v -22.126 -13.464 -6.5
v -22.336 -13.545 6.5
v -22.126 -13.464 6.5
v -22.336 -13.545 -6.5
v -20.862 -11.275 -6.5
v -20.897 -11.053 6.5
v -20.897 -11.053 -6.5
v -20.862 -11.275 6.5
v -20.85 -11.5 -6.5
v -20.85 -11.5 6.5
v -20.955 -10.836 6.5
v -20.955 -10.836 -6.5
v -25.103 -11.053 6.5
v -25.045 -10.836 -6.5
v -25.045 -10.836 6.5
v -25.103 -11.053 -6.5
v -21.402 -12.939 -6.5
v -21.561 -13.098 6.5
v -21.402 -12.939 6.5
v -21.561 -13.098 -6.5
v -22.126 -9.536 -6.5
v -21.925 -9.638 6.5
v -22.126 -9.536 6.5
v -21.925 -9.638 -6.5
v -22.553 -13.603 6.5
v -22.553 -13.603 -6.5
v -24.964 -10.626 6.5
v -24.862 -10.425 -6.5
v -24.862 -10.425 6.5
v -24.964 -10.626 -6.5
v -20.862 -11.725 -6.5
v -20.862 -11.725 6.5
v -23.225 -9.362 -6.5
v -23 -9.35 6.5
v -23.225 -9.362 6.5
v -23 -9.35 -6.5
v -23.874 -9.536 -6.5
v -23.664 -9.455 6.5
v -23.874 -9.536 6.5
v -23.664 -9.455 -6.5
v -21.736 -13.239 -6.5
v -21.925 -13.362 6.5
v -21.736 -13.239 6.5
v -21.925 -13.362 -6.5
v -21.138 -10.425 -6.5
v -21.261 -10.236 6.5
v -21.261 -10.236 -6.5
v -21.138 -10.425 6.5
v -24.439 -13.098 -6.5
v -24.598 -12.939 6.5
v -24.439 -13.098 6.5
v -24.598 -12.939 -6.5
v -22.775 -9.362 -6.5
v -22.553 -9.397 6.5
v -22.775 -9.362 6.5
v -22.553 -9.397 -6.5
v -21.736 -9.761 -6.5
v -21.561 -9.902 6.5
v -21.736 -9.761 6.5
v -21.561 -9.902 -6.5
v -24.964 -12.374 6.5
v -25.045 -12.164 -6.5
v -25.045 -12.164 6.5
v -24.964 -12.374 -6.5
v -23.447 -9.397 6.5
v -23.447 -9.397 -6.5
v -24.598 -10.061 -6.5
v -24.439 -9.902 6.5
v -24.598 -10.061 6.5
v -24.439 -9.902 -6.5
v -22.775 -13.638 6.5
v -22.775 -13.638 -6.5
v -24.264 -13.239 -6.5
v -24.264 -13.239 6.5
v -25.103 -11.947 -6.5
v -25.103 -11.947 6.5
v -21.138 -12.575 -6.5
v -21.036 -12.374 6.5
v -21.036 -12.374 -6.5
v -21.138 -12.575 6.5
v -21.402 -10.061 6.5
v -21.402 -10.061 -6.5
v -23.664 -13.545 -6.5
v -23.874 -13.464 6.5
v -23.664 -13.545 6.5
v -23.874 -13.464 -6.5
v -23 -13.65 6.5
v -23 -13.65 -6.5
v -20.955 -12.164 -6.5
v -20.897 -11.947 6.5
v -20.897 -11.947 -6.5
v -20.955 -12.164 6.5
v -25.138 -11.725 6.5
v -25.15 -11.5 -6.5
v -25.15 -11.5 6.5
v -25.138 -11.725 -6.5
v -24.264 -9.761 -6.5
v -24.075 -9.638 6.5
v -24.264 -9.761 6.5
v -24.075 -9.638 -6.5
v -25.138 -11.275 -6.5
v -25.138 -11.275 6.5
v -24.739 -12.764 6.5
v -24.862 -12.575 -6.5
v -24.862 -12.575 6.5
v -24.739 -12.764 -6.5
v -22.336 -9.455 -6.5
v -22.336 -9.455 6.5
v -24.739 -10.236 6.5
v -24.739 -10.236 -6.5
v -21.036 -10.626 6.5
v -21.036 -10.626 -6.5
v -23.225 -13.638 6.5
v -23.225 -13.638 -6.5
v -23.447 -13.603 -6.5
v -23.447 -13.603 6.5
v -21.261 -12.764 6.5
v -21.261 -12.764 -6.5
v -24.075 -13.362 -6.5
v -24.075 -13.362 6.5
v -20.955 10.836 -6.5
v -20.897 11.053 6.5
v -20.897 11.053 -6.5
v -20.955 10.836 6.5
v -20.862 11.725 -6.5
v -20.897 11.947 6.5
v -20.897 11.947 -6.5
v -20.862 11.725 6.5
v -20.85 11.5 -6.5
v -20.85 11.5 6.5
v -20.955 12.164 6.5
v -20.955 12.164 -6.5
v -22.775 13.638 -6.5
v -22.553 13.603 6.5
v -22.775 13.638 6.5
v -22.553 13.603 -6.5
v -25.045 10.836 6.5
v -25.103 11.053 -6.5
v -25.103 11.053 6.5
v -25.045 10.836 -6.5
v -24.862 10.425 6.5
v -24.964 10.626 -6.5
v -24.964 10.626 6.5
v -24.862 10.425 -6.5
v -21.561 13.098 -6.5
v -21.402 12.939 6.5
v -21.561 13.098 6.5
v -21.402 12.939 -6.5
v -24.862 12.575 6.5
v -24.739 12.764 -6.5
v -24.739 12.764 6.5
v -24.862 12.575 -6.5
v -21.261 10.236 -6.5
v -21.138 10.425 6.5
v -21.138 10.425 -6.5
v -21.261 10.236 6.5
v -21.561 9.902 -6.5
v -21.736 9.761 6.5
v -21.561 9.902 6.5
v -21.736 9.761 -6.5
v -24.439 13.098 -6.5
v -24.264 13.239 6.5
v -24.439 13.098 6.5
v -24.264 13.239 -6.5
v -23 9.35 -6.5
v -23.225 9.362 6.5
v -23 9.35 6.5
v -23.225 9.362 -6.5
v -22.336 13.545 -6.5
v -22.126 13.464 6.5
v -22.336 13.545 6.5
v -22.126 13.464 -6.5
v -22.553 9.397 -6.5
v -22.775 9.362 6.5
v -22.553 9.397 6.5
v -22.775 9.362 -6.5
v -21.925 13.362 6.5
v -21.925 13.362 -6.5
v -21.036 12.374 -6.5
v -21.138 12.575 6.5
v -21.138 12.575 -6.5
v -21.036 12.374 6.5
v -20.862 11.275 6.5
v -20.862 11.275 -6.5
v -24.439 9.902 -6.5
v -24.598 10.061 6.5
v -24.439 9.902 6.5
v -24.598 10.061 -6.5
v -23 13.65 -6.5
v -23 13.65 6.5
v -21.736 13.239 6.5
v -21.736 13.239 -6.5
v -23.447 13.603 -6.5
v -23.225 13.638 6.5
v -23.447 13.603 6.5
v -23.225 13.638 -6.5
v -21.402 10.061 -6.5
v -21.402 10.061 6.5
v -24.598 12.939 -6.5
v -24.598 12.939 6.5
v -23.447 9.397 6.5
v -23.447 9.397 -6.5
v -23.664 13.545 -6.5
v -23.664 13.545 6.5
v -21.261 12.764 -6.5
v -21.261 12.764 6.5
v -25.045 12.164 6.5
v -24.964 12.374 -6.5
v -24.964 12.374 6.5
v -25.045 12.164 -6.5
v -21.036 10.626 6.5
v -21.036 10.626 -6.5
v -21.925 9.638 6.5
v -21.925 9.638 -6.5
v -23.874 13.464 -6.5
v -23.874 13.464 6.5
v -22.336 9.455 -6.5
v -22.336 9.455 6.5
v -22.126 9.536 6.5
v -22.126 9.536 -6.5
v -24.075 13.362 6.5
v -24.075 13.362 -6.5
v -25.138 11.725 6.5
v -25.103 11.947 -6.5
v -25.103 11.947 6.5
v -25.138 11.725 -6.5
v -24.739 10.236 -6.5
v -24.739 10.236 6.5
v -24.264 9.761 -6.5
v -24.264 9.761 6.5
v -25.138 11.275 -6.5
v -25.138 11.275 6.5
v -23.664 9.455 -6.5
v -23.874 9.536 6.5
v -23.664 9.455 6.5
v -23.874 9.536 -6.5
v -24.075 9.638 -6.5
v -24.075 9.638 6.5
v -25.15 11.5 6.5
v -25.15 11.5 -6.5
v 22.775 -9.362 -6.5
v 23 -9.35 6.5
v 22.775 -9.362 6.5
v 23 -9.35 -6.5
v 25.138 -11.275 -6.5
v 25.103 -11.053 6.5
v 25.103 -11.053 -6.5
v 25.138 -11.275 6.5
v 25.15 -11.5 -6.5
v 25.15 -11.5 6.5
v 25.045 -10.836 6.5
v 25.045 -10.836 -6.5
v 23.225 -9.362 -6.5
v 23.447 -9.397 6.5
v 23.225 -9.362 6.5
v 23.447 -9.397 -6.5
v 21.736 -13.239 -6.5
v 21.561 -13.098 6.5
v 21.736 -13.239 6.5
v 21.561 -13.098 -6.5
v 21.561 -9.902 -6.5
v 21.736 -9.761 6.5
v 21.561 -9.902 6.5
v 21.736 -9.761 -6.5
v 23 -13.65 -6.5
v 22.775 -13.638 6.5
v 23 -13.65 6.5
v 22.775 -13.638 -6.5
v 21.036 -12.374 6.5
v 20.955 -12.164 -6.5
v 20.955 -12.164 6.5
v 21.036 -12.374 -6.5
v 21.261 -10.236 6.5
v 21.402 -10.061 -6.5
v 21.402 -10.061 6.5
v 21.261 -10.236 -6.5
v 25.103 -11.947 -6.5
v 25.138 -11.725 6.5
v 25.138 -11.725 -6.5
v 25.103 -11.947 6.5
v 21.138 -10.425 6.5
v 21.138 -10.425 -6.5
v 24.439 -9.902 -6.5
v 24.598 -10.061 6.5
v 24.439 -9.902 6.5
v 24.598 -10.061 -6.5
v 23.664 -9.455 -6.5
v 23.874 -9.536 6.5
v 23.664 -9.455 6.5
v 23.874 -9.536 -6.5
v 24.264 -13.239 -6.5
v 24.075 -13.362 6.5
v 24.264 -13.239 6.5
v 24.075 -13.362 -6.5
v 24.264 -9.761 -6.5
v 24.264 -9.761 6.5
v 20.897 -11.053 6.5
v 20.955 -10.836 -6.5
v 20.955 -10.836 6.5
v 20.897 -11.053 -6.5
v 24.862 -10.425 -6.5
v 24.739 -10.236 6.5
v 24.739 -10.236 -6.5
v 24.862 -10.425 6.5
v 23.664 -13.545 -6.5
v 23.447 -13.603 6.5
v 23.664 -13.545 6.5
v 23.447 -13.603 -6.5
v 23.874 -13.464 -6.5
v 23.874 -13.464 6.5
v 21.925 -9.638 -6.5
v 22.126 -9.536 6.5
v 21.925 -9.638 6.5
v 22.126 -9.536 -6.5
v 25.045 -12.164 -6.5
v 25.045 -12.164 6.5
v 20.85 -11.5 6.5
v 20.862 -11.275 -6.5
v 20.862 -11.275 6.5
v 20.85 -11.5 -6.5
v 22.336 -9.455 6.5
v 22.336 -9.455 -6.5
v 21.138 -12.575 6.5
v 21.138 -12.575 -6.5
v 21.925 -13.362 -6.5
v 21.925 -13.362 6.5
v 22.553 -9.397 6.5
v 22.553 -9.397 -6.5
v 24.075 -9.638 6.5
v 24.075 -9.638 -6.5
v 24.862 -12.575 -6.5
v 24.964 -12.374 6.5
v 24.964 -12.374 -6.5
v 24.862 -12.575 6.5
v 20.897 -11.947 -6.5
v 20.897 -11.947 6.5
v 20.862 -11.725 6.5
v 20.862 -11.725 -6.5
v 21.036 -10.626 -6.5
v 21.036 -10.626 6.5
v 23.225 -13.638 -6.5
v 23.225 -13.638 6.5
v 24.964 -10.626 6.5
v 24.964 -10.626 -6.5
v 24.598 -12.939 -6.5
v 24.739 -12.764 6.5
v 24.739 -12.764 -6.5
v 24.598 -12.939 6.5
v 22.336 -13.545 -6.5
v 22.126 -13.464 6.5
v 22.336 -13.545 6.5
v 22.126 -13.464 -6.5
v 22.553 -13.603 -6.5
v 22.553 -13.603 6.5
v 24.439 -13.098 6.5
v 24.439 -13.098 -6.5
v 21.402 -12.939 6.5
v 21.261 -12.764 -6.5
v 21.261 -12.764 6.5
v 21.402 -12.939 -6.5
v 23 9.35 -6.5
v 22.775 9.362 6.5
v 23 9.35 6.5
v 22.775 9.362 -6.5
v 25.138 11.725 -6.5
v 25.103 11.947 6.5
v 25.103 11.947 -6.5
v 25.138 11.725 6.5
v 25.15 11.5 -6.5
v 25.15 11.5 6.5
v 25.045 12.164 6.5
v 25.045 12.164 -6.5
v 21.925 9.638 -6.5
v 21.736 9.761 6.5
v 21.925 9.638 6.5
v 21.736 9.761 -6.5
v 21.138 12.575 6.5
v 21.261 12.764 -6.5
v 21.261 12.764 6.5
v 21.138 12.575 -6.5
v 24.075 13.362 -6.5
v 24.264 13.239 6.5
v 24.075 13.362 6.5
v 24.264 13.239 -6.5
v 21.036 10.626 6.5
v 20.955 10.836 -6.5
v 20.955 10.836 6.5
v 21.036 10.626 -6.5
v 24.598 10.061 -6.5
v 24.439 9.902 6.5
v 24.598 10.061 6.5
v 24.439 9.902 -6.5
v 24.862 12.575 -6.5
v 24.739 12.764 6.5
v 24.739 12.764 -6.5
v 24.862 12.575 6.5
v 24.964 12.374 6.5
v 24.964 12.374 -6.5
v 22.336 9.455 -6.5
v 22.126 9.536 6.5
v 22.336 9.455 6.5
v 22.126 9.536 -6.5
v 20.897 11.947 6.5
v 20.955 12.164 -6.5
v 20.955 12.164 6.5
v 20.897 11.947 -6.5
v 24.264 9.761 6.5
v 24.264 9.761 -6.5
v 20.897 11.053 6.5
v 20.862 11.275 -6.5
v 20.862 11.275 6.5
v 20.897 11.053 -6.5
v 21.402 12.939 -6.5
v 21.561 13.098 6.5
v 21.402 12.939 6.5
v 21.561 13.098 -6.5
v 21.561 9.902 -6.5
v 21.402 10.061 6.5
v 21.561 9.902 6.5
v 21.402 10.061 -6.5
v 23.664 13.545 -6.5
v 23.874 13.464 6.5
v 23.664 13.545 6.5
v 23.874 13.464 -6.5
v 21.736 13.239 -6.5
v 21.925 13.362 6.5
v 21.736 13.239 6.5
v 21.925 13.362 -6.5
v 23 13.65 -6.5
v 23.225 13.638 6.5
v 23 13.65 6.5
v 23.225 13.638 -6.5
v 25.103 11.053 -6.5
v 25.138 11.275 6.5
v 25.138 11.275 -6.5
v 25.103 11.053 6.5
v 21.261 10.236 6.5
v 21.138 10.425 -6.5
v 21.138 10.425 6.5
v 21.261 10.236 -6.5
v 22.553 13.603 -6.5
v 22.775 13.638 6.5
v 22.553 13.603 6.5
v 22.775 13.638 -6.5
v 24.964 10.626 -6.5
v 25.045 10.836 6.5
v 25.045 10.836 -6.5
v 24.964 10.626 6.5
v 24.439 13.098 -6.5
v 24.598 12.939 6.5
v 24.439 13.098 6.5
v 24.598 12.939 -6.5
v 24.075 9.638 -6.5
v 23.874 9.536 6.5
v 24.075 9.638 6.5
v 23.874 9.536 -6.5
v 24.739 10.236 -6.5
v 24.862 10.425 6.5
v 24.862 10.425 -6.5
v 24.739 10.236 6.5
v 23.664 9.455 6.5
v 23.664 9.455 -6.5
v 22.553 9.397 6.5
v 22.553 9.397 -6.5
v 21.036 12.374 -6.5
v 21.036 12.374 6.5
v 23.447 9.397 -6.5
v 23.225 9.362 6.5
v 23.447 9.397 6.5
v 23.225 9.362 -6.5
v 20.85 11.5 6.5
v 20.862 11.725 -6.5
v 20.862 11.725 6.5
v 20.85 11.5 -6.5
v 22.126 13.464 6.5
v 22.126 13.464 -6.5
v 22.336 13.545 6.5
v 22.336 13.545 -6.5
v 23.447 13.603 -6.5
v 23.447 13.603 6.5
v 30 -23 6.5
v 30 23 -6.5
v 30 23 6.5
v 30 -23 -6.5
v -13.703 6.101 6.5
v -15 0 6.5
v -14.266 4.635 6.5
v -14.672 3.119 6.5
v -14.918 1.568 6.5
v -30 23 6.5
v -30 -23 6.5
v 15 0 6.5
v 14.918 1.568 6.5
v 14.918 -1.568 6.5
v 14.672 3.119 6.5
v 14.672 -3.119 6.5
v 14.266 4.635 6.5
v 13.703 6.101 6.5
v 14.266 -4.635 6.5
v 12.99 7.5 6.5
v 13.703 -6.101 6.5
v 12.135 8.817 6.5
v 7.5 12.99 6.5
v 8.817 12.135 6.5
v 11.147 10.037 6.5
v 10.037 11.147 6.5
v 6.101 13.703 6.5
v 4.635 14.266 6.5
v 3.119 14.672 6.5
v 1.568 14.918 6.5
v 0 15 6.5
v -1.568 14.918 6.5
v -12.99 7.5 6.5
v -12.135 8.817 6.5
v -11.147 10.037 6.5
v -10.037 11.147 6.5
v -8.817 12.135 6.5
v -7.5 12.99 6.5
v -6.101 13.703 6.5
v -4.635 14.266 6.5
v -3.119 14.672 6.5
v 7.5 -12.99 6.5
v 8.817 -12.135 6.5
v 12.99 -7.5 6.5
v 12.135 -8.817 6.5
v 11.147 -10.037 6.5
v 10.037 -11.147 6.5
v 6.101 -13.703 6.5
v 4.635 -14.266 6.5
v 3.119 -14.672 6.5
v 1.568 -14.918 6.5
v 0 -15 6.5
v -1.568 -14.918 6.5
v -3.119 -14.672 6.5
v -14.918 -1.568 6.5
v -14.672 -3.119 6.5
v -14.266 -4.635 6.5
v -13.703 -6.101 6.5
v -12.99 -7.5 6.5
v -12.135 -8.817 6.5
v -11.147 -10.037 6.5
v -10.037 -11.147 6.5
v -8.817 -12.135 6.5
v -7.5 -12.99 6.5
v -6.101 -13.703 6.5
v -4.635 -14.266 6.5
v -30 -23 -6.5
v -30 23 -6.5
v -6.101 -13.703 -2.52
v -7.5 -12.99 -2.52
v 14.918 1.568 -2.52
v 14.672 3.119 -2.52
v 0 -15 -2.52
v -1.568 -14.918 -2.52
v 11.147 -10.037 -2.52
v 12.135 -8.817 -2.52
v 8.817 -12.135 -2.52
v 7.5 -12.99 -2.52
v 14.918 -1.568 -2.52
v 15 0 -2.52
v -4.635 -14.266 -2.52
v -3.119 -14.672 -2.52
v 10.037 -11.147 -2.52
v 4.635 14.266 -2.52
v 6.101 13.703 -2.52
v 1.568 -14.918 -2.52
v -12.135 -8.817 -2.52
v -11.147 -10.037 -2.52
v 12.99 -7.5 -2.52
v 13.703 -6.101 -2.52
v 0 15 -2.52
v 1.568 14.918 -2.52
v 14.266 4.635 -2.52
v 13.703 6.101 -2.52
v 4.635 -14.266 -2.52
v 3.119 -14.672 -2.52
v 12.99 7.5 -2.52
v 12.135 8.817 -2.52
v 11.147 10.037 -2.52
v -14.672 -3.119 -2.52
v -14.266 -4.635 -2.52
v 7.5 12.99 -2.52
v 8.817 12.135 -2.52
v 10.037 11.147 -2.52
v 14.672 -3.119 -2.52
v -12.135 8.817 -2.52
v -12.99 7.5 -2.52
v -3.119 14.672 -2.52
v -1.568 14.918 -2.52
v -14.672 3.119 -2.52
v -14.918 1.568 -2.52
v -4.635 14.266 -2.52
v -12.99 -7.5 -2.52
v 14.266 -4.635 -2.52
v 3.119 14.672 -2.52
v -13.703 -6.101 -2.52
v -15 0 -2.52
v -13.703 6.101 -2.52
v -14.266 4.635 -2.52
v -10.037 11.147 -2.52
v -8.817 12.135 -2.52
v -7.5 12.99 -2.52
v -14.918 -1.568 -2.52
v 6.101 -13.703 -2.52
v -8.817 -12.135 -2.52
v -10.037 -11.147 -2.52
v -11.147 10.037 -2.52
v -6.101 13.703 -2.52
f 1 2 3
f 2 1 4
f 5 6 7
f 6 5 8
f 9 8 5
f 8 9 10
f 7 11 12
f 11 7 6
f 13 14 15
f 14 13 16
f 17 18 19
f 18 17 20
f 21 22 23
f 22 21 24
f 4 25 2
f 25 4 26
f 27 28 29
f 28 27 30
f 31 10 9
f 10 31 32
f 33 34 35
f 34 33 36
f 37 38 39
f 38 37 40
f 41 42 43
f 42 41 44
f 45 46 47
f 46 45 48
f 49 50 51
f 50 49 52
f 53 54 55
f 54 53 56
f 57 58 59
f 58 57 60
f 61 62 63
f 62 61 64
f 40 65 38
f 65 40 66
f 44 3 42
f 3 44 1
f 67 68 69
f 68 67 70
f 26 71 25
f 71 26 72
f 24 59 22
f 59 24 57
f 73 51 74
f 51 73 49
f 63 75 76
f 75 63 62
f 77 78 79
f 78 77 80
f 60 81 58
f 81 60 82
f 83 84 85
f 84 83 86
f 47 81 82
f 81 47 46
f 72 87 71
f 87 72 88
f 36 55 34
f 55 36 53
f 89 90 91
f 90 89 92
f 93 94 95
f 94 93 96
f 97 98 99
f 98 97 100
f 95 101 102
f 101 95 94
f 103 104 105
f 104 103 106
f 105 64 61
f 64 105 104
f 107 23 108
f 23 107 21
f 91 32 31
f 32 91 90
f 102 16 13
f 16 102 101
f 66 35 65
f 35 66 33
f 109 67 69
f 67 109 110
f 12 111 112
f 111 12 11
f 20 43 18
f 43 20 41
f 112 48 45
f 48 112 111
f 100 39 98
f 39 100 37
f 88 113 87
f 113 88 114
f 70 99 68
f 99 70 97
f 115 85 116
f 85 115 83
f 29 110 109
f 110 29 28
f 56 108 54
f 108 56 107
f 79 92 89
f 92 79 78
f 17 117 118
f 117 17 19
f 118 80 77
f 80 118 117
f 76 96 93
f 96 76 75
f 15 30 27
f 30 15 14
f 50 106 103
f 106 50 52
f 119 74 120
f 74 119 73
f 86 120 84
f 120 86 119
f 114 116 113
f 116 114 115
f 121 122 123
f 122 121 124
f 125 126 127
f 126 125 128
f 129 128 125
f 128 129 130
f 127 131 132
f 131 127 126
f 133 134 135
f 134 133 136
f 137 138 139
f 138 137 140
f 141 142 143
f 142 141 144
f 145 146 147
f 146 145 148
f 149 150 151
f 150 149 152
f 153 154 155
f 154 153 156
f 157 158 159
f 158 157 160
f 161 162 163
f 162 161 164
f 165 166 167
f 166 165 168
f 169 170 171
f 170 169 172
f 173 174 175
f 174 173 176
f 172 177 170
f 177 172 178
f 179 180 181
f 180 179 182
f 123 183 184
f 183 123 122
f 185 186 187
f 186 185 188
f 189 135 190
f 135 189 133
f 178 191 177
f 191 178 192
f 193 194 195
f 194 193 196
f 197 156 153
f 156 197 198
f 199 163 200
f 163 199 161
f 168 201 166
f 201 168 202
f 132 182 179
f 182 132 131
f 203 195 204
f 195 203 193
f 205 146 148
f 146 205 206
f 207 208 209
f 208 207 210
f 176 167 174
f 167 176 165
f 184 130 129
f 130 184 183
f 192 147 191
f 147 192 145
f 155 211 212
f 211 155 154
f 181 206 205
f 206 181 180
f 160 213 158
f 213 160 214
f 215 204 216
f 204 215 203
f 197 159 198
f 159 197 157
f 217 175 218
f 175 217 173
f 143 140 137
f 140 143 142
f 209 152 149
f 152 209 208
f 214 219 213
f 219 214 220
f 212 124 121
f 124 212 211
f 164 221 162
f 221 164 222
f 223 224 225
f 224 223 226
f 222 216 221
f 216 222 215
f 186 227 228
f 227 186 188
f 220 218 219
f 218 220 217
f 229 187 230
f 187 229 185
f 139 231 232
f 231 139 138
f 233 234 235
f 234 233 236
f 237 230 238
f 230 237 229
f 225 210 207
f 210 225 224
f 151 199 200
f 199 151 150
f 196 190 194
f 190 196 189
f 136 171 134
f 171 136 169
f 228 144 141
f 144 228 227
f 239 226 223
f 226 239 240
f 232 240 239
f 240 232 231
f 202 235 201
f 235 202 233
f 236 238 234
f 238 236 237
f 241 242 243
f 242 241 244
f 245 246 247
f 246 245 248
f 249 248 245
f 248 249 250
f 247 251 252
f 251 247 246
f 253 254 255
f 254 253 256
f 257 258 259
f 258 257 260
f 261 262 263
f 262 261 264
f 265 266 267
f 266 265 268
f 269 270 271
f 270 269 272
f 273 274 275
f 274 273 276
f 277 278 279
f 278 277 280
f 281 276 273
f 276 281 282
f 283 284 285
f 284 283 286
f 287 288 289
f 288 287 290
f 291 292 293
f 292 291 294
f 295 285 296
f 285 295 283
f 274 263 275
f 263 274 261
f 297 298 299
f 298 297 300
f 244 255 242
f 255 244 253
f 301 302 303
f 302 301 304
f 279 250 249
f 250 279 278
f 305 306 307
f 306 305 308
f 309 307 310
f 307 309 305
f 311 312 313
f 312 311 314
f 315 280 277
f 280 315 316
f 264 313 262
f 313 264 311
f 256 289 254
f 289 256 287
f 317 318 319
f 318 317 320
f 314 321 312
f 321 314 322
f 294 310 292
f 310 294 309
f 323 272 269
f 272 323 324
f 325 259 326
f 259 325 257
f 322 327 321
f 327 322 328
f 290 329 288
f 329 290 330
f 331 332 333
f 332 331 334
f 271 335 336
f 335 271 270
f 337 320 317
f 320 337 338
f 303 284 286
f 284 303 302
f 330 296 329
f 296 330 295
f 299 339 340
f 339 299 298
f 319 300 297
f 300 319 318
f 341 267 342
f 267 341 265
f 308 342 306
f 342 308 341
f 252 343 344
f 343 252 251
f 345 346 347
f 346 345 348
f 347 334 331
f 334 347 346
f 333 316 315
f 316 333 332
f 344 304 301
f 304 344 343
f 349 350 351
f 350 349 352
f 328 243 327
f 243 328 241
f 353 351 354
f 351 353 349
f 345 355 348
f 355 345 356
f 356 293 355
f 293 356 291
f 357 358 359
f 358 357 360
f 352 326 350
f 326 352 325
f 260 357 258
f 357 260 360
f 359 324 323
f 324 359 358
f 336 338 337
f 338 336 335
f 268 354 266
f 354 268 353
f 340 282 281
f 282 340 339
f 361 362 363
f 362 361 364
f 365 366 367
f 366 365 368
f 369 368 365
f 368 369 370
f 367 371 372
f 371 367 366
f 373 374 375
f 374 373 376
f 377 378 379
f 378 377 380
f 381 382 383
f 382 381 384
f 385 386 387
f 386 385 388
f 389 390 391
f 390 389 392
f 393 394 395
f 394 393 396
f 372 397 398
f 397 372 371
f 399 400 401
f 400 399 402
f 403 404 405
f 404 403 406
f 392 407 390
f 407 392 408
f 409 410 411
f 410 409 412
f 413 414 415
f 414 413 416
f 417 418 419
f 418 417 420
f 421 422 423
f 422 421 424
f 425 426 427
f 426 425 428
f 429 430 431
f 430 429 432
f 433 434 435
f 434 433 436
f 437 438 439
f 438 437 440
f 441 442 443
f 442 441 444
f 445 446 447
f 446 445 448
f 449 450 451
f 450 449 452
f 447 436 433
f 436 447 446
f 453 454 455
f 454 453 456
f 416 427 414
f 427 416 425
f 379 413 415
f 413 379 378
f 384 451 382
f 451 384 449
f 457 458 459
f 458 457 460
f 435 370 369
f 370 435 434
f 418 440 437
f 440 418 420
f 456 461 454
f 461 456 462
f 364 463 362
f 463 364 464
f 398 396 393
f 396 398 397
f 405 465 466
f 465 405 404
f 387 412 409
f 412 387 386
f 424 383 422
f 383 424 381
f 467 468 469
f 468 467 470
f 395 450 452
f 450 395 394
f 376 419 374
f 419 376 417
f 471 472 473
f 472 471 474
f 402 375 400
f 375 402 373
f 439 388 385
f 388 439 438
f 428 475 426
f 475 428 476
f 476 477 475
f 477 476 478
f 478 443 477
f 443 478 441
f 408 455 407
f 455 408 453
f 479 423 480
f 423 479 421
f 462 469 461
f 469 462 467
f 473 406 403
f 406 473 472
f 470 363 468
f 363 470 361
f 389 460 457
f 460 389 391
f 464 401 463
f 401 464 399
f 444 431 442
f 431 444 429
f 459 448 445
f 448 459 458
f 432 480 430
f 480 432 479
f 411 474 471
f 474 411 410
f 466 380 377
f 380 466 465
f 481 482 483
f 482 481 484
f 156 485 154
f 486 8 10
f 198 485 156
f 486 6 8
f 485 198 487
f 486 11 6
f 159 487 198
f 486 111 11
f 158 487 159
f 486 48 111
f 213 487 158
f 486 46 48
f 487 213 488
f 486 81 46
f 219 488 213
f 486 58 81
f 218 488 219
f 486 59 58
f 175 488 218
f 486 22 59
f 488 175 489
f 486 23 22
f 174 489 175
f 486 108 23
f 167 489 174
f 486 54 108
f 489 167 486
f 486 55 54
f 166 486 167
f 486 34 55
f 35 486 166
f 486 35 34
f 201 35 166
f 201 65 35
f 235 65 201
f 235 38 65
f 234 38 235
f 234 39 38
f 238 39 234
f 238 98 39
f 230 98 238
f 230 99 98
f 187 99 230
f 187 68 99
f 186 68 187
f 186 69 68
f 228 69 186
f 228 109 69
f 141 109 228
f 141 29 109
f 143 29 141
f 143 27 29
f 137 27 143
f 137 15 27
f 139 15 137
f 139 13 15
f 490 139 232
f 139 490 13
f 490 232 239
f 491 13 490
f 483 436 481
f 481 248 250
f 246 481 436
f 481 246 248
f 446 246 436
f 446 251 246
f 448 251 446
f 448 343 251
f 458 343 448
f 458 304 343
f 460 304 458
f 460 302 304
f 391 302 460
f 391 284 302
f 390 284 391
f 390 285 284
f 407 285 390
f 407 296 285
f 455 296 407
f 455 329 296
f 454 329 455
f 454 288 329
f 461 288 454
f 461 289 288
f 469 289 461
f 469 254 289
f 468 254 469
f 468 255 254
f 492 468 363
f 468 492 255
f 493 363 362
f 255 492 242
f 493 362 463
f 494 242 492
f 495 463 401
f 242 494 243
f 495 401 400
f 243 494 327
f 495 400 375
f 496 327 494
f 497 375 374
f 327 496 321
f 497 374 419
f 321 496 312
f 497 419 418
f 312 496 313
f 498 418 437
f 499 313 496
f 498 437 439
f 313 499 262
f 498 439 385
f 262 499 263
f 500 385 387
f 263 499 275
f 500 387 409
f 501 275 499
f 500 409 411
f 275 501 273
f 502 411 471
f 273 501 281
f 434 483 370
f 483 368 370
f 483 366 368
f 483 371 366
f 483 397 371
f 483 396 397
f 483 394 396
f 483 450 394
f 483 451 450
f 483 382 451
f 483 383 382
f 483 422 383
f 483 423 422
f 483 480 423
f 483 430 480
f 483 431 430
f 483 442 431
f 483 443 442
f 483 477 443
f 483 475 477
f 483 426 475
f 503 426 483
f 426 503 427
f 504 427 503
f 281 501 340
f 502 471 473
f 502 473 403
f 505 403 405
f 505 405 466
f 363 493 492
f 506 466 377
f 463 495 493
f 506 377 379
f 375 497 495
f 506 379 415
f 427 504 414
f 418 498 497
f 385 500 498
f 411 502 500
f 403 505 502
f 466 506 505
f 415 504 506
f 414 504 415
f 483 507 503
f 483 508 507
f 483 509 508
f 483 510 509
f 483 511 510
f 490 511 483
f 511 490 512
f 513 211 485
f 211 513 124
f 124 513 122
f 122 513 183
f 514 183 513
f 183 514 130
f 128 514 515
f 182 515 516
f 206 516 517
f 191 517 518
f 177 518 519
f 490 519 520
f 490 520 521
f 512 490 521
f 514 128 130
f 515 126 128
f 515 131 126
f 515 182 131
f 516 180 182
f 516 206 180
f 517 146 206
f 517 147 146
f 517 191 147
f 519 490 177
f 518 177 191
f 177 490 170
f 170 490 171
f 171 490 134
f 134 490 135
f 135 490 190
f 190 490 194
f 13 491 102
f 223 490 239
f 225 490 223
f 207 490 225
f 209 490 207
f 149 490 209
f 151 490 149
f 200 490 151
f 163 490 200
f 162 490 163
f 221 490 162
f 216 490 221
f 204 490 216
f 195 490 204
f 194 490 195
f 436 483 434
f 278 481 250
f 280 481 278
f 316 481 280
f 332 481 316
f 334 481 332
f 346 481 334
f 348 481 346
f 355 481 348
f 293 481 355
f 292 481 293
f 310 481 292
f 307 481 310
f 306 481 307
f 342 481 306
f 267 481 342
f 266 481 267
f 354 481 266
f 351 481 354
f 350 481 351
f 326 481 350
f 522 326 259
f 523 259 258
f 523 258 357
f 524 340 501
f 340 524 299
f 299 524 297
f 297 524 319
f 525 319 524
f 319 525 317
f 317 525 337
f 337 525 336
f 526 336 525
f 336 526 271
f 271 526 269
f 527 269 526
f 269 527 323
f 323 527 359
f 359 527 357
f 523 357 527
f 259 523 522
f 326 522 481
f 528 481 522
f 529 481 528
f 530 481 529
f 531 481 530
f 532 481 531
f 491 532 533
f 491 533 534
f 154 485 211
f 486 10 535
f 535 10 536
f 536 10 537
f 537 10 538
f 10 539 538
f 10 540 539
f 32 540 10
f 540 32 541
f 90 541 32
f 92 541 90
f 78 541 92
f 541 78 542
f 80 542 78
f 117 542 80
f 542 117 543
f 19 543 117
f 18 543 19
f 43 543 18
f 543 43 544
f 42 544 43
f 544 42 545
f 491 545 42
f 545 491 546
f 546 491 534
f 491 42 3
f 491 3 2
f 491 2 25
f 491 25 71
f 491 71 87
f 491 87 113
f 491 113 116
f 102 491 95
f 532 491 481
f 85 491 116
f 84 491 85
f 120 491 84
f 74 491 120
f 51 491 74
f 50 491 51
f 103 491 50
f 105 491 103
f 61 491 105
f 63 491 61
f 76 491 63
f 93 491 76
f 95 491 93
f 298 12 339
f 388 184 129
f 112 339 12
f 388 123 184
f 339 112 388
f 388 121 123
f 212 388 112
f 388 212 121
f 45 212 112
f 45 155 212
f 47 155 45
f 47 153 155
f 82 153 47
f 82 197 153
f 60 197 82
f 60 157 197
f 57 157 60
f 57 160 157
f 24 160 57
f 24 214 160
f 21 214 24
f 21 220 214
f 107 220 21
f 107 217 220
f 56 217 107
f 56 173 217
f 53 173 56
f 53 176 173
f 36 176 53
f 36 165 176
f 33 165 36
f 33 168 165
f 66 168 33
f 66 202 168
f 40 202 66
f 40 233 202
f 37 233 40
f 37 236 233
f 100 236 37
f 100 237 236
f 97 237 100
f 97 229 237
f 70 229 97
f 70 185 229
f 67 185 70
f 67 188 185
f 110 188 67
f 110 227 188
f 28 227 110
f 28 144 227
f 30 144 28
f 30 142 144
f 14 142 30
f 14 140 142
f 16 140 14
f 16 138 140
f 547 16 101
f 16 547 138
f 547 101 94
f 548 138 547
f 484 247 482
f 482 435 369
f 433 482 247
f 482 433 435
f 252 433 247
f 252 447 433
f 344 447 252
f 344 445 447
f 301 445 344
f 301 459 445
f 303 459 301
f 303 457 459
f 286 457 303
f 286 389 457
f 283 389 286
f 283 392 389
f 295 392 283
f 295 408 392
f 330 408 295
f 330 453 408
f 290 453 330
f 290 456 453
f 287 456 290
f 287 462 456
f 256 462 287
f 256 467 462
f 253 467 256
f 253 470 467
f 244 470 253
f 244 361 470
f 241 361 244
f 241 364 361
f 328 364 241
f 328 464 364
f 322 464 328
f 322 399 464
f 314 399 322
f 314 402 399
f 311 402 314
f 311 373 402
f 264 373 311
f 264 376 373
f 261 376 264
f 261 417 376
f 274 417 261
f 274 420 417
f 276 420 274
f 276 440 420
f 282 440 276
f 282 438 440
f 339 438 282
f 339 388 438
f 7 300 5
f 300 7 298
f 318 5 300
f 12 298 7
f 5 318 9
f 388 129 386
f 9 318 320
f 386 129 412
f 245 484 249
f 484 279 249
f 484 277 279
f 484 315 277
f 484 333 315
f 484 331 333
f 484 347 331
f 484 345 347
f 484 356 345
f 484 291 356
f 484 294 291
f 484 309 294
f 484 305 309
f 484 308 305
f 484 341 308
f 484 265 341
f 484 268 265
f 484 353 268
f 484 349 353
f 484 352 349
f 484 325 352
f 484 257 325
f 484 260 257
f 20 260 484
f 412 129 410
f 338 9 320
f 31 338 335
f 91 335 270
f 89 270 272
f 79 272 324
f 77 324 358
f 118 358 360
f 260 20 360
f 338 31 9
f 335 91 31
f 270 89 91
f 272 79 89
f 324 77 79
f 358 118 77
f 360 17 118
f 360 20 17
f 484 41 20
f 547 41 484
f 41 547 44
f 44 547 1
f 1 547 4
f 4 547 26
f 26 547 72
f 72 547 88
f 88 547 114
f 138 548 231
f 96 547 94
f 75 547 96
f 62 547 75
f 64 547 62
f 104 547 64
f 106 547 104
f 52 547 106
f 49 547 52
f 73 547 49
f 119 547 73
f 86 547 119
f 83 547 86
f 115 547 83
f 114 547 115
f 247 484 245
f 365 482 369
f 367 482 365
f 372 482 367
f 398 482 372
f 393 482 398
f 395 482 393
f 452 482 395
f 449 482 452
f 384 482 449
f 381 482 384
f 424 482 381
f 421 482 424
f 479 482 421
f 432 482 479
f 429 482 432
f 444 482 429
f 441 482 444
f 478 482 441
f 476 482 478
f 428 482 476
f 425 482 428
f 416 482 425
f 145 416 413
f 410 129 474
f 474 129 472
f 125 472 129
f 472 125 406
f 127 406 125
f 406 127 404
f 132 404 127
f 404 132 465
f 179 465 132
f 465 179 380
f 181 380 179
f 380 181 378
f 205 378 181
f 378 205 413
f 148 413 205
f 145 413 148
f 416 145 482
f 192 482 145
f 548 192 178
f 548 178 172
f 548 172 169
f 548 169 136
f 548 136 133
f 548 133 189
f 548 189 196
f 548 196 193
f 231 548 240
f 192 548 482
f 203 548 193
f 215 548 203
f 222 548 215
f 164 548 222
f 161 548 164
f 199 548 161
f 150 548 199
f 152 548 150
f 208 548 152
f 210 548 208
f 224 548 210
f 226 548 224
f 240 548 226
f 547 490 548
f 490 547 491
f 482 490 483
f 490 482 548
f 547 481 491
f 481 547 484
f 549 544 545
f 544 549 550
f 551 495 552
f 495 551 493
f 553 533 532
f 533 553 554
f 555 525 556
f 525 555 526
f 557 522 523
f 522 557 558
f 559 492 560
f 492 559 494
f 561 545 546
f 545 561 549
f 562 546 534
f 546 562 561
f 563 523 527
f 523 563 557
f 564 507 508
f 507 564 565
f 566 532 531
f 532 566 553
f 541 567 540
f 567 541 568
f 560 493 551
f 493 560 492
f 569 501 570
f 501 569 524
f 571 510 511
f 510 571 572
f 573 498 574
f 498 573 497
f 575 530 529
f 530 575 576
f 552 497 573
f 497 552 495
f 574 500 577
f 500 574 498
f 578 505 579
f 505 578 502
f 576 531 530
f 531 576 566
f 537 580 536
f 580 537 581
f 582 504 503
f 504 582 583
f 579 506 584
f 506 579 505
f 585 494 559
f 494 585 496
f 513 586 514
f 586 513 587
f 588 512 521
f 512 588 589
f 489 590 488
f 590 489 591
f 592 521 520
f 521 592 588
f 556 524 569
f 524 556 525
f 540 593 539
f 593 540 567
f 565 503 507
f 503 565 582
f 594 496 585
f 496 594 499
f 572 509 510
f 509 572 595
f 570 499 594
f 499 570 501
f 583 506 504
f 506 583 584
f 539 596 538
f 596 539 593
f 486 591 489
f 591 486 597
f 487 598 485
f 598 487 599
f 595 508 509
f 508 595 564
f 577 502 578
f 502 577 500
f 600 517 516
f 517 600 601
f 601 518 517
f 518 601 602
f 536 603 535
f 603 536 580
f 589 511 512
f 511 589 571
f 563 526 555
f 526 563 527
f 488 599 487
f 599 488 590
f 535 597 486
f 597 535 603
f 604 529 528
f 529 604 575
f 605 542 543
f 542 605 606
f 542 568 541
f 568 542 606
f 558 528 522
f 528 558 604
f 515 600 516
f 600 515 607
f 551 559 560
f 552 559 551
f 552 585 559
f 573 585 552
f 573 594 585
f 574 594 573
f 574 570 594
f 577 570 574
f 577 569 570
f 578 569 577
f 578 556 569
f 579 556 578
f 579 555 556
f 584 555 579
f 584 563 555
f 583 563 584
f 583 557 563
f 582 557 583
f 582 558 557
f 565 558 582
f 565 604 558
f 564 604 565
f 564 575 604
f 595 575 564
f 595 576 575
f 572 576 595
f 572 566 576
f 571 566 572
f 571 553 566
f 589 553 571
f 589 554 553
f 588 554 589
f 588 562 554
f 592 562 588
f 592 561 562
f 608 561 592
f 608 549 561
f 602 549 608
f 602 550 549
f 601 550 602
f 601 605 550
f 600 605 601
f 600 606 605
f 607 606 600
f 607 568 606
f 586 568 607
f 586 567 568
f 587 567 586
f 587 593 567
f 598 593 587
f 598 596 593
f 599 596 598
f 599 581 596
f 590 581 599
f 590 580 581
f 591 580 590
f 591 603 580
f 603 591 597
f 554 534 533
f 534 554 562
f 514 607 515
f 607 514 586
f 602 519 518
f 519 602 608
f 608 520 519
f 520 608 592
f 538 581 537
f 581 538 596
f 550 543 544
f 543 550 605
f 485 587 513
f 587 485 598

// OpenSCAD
// Lead-screw nut holder with 30 mm pocket.
$fn = 60;
eps = 0.02;
body_l = 60;
body_w = 46;
body_t = 13;
pocket_d = 30;
pocket_depth = 9;
mount_x = 23.0;
difference() {
    cube([body_l, body_w, body_t], center = true);
    translate([0, 0, body_t / 2 - pocket_depth - eps]) cylinder(d = pocket_d, h = pocket_depth + 2 * eps);
    for (x = [-mount_x, mount_x], y = [-body_w / 4, body_w / 4])
        translate([x, y, -body_t / 2 - eps]) cylinder(d = 4.3, h = body_t + 2 * eps);
}
